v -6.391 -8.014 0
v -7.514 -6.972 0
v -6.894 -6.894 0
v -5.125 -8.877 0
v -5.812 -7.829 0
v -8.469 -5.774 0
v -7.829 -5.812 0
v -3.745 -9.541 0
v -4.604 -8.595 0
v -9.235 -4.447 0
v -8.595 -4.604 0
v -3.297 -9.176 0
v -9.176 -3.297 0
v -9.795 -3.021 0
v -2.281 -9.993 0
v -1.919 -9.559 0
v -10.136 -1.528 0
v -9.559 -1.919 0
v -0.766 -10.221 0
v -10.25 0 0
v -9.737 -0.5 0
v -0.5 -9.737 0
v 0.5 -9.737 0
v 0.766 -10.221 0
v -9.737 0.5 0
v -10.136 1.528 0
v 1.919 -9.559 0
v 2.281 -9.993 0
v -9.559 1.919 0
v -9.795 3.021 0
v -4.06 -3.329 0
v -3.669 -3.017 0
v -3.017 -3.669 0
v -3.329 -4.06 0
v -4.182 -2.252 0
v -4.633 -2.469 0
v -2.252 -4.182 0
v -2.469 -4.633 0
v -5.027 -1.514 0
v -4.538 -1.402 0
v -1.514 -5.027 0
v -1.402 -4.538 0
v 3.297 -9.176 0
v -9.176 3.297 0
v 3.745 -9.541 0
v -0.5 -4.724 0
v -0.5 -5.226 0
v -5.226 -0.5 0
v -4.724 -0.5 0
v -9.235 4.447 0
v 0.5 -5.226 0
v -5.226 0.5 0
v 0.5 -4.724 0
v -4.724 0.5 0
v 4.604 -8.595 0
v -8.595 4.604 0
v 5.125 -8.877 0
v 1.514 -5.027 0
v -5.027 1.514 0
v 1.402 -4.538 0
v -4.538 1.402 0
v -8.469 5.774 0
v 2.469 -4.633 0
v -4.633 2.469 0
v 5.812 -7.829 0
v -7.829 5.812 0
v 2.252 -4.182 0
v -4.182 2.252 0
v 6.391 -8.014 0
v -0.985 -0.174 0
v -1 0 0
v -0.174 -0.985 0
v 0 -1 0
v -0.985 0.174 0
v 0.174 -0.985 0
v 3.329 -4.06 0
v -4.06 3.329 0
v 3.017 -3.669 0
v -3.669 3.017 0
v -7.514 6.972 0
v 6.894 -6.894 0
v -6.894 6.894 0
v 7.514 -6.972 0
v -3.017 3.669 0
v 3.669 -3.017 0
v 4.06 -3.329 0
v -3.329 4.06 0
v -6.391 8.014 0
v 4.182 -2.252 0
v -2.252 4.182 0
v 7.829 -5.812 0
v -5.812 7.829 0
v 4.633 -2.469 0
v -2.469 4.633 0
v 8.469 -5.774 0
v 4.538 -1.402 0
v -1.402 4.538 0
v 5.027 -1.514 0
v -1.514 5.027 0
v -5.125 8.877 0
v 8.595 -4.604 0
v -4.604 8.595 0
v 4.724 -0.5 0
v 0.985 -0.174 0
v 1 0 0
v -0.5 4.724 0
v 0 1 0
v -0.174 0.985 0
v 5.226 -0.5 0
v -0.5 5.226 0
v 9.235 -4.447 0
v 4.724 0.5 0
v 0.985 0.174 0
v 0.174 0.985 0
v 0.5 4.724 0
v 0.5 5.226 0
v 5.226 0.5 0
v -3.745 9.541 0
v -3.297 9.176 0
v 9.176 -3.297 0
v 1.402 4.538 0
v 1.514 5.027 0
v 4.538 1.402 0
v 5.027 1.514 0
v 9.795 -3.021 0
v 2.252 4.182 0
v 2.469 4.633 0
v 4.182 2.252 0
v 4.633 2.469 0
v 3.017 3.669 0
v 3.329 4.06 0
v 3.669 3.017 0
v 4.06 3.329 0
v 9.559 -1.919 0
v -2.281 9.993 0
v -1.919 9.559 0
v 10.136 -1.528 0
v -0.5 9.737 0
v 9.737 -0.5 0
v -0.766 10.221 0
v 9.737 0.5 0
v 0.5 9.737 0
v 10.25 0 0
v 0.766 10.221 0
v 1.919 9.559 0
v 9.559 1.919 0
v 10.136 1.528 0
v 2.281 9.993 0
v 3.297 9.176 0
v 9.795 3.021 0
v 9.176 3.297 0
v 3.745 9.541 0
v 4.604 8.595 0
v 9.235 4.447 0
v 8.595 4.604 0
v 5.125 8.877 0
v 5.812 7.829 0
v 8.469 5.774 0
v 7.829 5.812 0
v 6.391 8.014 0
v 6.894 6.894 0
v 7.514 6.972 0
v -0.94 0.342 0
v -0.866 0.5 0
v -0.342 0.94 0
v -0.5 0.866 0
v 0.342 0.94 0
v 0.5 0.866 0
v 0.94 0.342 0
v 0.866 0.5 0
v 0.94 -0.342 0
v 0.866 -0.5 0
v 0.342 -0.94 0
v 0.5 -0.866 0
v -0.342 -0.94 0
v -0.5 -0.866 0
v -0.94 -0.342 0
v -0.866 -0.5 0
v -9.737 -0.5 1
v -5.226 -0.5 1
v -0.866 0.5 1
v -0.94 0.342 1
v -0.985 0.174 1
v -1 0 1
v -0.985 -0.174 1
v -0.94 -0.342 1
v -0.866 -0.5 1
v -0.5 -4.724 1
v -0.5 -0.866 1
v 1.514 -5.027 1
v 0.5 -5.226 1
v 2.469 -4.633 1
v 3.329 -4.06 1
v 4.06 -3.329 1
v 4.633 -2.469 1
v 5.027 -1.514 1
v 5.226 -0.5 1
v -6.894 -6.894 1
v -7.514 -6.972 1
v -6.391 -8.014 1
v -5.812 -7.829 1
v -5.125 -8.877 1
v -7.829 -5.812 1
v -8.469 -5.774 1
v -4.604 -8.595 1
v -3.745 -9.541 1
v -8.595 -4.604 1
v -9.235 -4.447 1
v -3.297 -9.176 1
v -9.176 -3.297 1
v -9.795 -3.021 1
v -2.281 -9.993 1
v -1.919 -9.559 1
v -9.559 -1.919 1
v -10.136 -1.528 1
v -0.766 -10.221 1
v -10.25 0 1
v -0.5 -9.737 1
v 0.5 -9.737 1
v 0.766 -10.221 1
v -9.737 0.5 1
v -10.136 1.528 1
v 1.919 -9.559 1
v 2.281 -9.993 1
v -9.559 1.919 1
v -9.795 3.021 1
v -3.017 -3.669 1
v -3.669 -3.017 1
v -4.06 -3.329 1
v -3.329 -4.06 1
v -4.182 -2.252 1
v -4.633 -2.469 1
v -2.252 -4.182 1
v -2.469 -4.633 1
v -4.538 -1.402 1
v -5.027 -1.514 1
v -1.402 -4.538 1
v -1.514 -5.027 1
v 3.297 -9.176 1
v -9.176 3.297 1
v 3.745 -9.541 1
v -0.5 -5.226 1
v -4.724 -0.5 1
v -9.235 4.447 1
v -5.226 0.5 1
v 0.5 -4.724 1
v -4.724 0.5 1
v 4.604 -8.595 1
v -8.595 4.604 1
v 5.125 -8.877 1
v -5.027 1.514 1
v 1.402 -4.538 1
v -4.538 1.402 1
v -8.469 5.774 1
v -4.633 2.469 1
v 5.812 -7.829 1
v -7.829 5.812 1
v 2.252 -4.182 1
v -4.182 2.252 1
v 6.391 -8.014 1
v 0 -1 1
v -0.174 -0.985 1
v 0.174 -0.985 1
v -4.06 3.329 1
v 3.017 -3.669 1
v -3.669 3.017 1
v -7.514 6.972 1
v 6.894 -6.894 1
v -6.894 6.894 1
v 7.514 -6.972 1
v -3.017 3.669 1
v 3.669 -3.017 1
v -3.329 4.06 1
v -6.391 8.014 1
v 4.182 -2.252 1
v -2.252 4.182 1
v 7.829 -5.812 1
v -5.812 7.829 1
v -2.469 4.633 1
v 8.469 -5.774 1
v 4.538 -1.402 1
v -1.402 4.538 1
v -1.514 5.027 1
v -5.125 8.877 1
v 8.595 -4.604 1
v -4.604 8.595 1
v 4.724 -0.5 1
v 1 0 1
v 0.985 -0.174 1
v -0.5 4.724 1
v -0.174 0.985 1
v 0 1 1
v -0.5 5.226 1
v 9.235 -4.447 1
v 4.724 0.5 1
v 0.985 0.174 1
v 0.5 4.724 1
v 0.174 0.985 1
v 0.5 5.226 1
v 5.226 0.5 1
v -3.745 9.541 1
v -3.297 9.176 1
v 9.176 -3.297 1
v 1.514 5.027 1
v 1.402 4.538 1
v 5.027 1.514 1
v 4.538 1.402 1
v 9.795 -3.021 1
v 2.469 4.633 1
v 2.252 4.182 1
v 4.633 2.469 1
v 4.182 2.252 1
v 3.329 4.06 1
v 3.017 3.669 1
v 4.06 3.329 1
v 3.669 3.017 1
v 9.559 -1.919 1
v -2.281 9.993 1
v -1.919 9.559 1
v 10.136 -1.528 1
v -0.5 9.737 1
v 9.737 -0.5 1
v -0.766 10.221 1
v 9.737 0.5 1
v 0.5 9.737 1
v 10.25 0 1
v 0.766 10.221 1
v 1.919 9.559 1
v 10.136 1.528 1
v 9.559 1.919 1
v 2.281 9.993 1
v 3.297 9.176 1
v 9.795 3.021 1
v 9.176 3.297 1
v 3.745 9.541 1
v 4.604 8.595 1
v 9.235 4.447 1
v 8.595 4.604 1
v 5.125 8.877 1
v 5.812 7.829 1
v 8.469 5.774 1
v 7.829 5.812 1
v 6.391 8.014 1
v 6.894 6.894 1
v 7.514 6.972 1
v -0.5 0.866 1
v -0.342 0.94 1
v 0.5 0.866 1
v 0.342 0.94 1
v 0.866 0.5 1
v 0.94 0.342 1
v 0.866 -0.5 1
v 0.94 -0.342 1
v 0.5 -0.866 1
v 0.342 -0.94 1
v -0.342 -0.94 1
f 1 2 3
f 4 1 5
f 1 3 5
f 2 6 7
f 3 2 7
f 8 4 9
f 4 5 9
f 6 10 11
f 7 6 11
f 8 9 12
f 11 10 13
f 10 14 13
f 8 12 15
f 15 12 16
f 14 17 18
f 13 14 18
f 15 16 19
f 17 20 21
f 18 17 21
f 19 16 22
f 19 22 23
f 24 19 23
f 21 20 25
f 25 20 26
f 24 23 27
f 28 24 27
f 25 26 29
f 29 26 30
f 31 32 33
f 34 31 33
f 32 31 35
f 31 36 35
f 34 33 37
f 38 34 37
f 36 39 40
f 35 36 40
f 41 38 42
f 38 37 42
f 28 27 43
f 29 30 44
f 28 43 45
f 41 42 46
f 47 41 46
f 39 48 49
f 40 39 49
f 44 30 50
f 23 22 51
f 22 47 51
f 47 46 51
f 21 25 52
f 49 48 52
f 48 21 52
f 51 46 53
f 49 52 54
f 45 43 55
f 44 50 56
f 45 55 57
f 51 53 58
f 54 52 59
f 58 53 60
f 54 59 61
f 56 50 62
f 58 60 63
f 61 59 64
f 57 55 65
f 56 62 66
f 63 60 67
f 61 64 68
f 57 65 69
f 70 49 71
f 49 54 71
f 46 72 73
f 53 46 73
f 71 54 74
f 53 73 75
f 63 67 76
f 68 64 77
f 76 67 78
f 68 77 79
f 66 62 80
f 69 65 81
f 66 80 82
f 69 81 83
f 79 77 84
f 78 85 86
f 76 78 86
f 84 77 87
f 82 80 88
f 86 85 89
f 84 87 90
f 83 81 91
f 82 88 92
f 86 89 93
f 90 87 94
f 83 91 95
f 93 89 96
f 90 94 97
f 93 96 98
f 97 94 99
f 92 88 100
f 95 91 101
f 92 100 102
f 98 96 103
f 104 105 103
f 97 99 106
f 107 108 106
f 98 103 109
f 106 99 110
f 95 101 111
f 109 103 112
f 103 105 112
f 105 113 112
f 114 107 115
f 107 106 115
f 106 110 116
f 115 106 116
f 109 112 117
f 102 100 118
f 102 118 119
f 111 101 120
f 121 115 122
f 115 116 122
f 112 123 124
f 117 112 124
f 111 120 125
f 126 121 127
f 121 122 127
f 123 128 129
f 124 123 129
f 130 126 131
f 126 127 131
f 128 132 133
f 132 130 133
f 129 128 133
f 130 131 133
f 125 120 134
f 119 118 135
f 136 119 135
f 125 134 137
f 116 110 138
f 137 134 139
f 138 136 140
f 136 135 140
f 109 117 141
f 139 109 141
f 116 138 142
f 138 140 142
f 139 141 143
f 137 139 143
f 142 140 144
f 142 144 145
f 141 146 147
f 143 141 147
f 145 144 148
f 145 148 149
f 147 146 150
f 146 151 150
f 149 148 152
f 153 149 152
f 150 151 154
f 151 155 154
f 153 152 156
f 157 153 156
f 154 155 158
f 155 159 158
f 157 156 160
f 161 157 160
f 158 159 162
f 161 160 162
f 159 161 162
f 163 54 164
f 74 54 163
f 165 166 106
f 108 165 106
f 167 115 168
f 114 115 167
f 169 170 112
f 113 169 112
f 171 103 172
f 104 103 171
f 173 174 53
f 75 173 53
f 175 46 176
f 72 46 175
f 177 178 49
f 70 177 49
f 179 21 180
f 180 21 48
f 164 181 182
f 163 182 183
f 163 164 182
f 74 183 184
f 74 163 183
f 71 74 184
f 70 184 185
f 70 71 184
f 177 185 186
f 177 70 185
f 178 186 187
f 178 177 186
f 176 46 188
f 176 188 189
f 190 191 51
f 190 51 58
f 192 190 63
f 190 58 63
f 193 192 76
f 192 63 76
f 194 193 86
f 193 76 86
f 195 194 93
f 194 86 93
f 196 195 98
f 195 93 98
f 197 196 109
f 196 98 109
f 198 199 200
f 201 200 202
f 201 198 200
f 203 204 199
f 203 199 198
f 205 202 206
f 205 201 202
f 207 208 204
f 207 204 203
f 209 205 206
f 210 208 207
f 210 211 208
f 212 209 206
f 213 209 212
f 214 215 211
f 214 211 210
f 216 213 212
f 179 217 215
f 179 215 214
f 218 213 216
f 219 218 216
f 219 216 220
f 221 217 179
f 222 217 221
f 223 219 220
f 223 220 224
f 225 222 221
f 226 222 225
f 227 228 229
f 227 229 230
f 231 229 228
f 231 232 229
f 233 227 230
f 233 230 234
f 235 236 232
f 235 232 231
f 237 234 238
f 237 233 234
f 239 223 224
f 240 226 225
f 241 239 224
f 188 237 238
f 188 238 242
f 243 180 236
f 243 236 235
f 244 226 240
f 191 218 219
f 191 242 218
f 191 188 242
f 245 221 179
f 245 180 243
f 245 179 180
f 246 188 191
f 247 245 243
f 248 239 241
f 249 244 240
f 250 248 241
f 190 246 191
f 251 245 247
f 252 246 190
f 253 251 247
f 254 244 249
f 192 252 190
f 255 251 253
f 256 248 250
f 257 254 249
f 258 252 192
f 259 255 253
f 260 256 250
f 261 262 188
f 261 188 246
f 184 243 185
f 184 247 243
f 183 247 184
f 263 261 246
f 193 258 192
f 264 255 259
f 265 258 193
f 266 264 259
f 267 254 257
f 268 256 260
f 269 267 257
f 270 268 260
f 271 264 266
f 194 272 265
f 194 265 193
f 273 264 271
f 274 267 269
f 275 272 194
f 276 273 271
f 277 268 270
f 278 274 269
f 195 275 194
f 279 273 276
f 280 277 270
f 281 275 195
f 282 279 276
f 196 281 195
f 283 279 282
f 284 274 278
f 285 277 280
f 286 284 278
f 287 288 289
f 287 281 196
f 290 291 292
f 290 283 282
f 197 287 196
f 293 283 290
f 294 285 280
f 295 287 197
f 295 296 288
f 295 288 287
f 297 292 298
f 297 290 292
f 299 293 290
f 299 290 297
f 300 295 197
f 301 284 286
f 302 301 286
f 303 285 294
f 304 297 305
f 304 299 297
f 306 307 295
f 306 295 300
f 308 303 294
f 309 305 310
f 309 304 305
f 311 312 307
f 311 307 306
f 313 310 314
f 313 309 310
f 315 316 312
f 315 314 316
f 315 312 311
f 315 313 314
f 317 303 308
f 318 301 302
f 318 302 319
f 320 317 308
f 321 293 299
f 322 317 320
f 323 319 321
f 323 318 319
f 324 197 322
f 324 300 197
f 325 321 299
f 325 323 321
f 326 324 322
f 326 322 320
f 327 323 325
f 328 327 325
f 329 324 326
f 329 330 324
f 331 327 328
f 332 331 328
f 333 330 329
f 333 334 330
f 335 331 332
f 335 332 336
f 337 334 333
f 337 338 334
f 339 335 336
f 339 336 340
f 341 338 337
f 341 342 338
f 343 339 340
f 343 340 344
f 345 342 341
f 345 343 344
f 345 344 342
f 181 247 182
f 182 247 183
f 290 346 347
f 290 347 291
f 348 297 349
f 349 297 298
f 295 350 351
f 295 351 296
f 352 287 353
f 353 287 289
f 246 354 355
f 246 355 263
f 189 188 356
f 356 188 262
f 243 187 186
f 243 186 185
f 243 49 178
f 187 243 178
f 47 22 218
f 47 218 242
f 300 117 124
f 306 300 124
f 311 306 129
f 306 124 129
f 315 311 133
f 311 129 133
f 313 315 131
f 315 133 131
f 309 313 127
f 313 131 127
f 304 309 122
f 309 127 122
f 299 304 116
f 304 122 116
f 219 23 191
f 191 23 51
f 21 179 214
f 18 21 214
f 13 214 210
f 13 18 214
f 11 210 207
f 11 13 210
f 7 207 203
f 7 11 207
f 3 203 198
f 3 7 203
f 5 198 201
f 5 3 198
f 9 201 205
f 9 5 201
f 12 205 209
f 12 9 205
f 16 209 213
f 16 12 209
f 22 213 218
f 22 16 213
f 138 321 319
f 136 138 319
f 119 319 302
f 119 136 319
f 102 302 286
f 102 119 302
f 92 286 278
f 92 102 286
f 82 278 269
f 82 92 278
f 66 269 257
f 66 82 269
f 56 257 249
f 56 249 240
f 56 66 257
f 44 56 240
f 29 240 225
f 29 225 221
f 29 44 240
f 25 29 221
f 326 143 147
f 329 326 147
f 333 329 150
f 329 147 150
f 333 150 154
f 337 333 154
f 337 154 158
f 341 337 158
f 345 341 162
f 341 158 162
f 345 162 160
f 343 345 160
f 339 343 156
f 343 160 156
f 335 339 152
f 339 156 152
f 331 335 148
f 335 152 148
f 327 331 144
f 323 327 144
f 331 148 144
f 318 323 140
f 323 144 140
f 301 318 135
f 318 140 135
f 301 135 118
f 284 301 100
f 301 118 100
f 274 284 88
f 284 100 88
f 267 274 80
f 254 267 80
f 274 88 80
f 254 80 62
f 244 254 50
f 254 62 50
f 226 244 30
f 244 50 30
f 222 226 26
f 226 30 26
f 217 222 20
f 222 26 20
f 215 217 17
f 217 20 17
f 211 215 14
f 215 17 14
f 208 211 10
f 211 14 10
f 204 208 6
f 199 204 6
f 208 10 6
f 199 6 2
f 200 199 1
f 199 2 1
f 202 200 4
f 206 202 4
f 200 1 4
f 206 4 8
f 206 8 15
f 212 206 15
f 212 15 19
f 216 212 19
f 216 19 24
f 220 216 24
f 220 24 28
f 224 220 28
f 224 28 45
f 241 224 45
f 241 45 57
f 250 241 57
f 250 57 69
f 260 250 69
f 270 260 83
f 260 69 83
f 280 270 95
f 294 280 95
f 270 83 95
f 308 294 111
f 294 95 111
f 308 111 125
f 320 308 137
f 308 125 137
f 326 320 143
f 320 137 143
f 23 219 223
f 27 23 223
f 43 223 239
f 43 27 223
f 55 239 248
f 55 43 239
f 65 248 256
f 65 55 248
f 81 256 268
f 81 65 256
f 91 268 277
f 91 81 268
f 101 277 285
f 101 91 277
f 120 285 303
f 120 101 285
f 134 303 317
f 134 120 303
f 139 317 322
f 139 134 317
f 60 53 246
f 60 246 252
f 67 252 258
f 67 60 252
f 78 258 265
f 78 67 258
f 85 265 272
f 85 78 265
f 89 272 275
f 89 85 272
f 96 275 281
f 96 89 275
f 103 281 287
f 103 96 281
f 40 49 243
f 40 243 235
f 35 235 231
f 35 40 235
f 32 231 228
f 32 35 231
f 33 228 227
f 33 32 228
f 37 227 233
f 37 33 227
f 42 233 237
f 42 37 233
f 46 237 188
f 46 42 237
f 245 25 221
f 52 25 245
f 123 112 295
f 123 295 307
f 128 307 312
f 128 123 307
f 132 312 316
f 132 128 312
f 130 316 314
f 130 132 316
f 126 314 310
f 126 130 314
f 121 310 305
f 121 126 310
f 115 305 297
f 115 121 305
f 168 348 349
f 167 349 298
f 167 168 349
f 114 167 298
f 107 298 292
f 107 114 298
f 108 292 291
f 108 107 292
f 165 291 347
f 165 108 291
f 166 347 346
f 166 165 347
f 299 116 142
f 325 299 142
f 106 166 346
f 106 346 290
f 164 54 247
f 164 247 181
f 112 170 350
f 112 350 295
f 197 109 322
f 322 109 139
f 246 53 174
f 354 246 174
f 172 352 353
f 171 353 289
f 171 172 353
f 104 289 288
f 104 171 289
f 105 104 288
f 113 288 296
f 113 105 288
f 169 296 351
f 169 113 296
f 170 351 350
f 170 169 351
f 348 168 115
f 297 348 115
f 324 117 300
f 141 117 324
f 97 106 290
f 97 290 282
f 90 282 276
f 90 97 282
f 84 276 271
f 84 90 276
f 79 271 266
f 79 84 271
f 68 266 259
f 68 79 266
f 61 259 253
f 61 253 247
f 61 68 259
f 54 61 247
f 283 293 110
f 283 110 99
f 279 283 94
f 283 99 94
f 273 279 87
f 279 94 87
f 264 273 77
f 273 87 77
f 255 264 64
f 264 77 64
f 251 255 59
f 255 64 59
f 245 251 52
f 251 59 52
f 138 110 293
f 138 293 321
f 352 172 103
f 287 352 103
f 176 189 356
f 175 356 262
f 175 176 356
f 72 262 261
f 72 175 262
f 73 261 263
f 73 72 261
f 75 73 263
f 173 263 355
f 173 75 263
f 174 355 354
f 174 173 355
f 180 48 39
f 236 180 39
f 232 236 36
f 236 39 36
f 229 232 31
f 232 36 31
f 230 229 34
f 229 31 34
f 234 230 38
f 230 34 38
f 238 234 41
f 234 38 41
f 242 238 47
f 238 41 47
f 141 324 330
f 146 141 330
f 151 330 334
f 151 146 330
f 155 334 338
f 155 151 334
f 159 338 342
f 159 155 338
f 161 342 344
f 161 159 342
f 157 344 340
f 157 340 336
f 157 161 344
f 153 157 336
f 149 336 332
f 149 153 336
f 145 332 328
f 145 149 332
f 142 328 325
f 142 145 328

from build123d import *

# Parameters (mm, degrees)
F0_W     = 9.5
F0_H     = 1
F0_W_2   = 1
F0_H_2   = 9.5
F1_DEPTH = 1
F2_R     = 10.25
F2_R_2   = 9.75
F2_R_3   = 5.25
F2_R_4   = 4.75
F3_DEPTH = 1
F4_R     = 1
F5_DEPTH = 25


with BuildPart() as f1:
    # F0 (on Top) → F1 (new body)
    with BuildSketch(Plane.XY):
        with Locations((-5.25, 0)):
            Rectangle(F0_W, F0_H)
        with Locations((0, 5.25)):
            Rectangle(F0_W_2, F0_H_2)
        with Locations((5.25, 0)):
            Rectangle(F0_W, F0_H)
        with Locations((0, -5.25)):
            Rectangle(F0_W_2, F0_H_2)
    extrude(amount=F1_DEPTH)

    # F2 (on Top) → F3 (join)
    with BuildSketch(Plane.XY):
        Circle(F2_R)
        Circle(F2_R_2, mode=Mode.SUBTRACT)
        Circle(F2_R_3)
        Circle(F2_R_4, mode=Mode.SUBTRACT)
    extrude(amount=F3_DEPTH)

    # F4 (on Top) → F5 (cut)
    with BuildSketch(Plane.XY):
        Circle(F4_R)
    extrude(amount=F5_DEPTH, mode=Mode.SUBTRACT)


solid = f1.part
